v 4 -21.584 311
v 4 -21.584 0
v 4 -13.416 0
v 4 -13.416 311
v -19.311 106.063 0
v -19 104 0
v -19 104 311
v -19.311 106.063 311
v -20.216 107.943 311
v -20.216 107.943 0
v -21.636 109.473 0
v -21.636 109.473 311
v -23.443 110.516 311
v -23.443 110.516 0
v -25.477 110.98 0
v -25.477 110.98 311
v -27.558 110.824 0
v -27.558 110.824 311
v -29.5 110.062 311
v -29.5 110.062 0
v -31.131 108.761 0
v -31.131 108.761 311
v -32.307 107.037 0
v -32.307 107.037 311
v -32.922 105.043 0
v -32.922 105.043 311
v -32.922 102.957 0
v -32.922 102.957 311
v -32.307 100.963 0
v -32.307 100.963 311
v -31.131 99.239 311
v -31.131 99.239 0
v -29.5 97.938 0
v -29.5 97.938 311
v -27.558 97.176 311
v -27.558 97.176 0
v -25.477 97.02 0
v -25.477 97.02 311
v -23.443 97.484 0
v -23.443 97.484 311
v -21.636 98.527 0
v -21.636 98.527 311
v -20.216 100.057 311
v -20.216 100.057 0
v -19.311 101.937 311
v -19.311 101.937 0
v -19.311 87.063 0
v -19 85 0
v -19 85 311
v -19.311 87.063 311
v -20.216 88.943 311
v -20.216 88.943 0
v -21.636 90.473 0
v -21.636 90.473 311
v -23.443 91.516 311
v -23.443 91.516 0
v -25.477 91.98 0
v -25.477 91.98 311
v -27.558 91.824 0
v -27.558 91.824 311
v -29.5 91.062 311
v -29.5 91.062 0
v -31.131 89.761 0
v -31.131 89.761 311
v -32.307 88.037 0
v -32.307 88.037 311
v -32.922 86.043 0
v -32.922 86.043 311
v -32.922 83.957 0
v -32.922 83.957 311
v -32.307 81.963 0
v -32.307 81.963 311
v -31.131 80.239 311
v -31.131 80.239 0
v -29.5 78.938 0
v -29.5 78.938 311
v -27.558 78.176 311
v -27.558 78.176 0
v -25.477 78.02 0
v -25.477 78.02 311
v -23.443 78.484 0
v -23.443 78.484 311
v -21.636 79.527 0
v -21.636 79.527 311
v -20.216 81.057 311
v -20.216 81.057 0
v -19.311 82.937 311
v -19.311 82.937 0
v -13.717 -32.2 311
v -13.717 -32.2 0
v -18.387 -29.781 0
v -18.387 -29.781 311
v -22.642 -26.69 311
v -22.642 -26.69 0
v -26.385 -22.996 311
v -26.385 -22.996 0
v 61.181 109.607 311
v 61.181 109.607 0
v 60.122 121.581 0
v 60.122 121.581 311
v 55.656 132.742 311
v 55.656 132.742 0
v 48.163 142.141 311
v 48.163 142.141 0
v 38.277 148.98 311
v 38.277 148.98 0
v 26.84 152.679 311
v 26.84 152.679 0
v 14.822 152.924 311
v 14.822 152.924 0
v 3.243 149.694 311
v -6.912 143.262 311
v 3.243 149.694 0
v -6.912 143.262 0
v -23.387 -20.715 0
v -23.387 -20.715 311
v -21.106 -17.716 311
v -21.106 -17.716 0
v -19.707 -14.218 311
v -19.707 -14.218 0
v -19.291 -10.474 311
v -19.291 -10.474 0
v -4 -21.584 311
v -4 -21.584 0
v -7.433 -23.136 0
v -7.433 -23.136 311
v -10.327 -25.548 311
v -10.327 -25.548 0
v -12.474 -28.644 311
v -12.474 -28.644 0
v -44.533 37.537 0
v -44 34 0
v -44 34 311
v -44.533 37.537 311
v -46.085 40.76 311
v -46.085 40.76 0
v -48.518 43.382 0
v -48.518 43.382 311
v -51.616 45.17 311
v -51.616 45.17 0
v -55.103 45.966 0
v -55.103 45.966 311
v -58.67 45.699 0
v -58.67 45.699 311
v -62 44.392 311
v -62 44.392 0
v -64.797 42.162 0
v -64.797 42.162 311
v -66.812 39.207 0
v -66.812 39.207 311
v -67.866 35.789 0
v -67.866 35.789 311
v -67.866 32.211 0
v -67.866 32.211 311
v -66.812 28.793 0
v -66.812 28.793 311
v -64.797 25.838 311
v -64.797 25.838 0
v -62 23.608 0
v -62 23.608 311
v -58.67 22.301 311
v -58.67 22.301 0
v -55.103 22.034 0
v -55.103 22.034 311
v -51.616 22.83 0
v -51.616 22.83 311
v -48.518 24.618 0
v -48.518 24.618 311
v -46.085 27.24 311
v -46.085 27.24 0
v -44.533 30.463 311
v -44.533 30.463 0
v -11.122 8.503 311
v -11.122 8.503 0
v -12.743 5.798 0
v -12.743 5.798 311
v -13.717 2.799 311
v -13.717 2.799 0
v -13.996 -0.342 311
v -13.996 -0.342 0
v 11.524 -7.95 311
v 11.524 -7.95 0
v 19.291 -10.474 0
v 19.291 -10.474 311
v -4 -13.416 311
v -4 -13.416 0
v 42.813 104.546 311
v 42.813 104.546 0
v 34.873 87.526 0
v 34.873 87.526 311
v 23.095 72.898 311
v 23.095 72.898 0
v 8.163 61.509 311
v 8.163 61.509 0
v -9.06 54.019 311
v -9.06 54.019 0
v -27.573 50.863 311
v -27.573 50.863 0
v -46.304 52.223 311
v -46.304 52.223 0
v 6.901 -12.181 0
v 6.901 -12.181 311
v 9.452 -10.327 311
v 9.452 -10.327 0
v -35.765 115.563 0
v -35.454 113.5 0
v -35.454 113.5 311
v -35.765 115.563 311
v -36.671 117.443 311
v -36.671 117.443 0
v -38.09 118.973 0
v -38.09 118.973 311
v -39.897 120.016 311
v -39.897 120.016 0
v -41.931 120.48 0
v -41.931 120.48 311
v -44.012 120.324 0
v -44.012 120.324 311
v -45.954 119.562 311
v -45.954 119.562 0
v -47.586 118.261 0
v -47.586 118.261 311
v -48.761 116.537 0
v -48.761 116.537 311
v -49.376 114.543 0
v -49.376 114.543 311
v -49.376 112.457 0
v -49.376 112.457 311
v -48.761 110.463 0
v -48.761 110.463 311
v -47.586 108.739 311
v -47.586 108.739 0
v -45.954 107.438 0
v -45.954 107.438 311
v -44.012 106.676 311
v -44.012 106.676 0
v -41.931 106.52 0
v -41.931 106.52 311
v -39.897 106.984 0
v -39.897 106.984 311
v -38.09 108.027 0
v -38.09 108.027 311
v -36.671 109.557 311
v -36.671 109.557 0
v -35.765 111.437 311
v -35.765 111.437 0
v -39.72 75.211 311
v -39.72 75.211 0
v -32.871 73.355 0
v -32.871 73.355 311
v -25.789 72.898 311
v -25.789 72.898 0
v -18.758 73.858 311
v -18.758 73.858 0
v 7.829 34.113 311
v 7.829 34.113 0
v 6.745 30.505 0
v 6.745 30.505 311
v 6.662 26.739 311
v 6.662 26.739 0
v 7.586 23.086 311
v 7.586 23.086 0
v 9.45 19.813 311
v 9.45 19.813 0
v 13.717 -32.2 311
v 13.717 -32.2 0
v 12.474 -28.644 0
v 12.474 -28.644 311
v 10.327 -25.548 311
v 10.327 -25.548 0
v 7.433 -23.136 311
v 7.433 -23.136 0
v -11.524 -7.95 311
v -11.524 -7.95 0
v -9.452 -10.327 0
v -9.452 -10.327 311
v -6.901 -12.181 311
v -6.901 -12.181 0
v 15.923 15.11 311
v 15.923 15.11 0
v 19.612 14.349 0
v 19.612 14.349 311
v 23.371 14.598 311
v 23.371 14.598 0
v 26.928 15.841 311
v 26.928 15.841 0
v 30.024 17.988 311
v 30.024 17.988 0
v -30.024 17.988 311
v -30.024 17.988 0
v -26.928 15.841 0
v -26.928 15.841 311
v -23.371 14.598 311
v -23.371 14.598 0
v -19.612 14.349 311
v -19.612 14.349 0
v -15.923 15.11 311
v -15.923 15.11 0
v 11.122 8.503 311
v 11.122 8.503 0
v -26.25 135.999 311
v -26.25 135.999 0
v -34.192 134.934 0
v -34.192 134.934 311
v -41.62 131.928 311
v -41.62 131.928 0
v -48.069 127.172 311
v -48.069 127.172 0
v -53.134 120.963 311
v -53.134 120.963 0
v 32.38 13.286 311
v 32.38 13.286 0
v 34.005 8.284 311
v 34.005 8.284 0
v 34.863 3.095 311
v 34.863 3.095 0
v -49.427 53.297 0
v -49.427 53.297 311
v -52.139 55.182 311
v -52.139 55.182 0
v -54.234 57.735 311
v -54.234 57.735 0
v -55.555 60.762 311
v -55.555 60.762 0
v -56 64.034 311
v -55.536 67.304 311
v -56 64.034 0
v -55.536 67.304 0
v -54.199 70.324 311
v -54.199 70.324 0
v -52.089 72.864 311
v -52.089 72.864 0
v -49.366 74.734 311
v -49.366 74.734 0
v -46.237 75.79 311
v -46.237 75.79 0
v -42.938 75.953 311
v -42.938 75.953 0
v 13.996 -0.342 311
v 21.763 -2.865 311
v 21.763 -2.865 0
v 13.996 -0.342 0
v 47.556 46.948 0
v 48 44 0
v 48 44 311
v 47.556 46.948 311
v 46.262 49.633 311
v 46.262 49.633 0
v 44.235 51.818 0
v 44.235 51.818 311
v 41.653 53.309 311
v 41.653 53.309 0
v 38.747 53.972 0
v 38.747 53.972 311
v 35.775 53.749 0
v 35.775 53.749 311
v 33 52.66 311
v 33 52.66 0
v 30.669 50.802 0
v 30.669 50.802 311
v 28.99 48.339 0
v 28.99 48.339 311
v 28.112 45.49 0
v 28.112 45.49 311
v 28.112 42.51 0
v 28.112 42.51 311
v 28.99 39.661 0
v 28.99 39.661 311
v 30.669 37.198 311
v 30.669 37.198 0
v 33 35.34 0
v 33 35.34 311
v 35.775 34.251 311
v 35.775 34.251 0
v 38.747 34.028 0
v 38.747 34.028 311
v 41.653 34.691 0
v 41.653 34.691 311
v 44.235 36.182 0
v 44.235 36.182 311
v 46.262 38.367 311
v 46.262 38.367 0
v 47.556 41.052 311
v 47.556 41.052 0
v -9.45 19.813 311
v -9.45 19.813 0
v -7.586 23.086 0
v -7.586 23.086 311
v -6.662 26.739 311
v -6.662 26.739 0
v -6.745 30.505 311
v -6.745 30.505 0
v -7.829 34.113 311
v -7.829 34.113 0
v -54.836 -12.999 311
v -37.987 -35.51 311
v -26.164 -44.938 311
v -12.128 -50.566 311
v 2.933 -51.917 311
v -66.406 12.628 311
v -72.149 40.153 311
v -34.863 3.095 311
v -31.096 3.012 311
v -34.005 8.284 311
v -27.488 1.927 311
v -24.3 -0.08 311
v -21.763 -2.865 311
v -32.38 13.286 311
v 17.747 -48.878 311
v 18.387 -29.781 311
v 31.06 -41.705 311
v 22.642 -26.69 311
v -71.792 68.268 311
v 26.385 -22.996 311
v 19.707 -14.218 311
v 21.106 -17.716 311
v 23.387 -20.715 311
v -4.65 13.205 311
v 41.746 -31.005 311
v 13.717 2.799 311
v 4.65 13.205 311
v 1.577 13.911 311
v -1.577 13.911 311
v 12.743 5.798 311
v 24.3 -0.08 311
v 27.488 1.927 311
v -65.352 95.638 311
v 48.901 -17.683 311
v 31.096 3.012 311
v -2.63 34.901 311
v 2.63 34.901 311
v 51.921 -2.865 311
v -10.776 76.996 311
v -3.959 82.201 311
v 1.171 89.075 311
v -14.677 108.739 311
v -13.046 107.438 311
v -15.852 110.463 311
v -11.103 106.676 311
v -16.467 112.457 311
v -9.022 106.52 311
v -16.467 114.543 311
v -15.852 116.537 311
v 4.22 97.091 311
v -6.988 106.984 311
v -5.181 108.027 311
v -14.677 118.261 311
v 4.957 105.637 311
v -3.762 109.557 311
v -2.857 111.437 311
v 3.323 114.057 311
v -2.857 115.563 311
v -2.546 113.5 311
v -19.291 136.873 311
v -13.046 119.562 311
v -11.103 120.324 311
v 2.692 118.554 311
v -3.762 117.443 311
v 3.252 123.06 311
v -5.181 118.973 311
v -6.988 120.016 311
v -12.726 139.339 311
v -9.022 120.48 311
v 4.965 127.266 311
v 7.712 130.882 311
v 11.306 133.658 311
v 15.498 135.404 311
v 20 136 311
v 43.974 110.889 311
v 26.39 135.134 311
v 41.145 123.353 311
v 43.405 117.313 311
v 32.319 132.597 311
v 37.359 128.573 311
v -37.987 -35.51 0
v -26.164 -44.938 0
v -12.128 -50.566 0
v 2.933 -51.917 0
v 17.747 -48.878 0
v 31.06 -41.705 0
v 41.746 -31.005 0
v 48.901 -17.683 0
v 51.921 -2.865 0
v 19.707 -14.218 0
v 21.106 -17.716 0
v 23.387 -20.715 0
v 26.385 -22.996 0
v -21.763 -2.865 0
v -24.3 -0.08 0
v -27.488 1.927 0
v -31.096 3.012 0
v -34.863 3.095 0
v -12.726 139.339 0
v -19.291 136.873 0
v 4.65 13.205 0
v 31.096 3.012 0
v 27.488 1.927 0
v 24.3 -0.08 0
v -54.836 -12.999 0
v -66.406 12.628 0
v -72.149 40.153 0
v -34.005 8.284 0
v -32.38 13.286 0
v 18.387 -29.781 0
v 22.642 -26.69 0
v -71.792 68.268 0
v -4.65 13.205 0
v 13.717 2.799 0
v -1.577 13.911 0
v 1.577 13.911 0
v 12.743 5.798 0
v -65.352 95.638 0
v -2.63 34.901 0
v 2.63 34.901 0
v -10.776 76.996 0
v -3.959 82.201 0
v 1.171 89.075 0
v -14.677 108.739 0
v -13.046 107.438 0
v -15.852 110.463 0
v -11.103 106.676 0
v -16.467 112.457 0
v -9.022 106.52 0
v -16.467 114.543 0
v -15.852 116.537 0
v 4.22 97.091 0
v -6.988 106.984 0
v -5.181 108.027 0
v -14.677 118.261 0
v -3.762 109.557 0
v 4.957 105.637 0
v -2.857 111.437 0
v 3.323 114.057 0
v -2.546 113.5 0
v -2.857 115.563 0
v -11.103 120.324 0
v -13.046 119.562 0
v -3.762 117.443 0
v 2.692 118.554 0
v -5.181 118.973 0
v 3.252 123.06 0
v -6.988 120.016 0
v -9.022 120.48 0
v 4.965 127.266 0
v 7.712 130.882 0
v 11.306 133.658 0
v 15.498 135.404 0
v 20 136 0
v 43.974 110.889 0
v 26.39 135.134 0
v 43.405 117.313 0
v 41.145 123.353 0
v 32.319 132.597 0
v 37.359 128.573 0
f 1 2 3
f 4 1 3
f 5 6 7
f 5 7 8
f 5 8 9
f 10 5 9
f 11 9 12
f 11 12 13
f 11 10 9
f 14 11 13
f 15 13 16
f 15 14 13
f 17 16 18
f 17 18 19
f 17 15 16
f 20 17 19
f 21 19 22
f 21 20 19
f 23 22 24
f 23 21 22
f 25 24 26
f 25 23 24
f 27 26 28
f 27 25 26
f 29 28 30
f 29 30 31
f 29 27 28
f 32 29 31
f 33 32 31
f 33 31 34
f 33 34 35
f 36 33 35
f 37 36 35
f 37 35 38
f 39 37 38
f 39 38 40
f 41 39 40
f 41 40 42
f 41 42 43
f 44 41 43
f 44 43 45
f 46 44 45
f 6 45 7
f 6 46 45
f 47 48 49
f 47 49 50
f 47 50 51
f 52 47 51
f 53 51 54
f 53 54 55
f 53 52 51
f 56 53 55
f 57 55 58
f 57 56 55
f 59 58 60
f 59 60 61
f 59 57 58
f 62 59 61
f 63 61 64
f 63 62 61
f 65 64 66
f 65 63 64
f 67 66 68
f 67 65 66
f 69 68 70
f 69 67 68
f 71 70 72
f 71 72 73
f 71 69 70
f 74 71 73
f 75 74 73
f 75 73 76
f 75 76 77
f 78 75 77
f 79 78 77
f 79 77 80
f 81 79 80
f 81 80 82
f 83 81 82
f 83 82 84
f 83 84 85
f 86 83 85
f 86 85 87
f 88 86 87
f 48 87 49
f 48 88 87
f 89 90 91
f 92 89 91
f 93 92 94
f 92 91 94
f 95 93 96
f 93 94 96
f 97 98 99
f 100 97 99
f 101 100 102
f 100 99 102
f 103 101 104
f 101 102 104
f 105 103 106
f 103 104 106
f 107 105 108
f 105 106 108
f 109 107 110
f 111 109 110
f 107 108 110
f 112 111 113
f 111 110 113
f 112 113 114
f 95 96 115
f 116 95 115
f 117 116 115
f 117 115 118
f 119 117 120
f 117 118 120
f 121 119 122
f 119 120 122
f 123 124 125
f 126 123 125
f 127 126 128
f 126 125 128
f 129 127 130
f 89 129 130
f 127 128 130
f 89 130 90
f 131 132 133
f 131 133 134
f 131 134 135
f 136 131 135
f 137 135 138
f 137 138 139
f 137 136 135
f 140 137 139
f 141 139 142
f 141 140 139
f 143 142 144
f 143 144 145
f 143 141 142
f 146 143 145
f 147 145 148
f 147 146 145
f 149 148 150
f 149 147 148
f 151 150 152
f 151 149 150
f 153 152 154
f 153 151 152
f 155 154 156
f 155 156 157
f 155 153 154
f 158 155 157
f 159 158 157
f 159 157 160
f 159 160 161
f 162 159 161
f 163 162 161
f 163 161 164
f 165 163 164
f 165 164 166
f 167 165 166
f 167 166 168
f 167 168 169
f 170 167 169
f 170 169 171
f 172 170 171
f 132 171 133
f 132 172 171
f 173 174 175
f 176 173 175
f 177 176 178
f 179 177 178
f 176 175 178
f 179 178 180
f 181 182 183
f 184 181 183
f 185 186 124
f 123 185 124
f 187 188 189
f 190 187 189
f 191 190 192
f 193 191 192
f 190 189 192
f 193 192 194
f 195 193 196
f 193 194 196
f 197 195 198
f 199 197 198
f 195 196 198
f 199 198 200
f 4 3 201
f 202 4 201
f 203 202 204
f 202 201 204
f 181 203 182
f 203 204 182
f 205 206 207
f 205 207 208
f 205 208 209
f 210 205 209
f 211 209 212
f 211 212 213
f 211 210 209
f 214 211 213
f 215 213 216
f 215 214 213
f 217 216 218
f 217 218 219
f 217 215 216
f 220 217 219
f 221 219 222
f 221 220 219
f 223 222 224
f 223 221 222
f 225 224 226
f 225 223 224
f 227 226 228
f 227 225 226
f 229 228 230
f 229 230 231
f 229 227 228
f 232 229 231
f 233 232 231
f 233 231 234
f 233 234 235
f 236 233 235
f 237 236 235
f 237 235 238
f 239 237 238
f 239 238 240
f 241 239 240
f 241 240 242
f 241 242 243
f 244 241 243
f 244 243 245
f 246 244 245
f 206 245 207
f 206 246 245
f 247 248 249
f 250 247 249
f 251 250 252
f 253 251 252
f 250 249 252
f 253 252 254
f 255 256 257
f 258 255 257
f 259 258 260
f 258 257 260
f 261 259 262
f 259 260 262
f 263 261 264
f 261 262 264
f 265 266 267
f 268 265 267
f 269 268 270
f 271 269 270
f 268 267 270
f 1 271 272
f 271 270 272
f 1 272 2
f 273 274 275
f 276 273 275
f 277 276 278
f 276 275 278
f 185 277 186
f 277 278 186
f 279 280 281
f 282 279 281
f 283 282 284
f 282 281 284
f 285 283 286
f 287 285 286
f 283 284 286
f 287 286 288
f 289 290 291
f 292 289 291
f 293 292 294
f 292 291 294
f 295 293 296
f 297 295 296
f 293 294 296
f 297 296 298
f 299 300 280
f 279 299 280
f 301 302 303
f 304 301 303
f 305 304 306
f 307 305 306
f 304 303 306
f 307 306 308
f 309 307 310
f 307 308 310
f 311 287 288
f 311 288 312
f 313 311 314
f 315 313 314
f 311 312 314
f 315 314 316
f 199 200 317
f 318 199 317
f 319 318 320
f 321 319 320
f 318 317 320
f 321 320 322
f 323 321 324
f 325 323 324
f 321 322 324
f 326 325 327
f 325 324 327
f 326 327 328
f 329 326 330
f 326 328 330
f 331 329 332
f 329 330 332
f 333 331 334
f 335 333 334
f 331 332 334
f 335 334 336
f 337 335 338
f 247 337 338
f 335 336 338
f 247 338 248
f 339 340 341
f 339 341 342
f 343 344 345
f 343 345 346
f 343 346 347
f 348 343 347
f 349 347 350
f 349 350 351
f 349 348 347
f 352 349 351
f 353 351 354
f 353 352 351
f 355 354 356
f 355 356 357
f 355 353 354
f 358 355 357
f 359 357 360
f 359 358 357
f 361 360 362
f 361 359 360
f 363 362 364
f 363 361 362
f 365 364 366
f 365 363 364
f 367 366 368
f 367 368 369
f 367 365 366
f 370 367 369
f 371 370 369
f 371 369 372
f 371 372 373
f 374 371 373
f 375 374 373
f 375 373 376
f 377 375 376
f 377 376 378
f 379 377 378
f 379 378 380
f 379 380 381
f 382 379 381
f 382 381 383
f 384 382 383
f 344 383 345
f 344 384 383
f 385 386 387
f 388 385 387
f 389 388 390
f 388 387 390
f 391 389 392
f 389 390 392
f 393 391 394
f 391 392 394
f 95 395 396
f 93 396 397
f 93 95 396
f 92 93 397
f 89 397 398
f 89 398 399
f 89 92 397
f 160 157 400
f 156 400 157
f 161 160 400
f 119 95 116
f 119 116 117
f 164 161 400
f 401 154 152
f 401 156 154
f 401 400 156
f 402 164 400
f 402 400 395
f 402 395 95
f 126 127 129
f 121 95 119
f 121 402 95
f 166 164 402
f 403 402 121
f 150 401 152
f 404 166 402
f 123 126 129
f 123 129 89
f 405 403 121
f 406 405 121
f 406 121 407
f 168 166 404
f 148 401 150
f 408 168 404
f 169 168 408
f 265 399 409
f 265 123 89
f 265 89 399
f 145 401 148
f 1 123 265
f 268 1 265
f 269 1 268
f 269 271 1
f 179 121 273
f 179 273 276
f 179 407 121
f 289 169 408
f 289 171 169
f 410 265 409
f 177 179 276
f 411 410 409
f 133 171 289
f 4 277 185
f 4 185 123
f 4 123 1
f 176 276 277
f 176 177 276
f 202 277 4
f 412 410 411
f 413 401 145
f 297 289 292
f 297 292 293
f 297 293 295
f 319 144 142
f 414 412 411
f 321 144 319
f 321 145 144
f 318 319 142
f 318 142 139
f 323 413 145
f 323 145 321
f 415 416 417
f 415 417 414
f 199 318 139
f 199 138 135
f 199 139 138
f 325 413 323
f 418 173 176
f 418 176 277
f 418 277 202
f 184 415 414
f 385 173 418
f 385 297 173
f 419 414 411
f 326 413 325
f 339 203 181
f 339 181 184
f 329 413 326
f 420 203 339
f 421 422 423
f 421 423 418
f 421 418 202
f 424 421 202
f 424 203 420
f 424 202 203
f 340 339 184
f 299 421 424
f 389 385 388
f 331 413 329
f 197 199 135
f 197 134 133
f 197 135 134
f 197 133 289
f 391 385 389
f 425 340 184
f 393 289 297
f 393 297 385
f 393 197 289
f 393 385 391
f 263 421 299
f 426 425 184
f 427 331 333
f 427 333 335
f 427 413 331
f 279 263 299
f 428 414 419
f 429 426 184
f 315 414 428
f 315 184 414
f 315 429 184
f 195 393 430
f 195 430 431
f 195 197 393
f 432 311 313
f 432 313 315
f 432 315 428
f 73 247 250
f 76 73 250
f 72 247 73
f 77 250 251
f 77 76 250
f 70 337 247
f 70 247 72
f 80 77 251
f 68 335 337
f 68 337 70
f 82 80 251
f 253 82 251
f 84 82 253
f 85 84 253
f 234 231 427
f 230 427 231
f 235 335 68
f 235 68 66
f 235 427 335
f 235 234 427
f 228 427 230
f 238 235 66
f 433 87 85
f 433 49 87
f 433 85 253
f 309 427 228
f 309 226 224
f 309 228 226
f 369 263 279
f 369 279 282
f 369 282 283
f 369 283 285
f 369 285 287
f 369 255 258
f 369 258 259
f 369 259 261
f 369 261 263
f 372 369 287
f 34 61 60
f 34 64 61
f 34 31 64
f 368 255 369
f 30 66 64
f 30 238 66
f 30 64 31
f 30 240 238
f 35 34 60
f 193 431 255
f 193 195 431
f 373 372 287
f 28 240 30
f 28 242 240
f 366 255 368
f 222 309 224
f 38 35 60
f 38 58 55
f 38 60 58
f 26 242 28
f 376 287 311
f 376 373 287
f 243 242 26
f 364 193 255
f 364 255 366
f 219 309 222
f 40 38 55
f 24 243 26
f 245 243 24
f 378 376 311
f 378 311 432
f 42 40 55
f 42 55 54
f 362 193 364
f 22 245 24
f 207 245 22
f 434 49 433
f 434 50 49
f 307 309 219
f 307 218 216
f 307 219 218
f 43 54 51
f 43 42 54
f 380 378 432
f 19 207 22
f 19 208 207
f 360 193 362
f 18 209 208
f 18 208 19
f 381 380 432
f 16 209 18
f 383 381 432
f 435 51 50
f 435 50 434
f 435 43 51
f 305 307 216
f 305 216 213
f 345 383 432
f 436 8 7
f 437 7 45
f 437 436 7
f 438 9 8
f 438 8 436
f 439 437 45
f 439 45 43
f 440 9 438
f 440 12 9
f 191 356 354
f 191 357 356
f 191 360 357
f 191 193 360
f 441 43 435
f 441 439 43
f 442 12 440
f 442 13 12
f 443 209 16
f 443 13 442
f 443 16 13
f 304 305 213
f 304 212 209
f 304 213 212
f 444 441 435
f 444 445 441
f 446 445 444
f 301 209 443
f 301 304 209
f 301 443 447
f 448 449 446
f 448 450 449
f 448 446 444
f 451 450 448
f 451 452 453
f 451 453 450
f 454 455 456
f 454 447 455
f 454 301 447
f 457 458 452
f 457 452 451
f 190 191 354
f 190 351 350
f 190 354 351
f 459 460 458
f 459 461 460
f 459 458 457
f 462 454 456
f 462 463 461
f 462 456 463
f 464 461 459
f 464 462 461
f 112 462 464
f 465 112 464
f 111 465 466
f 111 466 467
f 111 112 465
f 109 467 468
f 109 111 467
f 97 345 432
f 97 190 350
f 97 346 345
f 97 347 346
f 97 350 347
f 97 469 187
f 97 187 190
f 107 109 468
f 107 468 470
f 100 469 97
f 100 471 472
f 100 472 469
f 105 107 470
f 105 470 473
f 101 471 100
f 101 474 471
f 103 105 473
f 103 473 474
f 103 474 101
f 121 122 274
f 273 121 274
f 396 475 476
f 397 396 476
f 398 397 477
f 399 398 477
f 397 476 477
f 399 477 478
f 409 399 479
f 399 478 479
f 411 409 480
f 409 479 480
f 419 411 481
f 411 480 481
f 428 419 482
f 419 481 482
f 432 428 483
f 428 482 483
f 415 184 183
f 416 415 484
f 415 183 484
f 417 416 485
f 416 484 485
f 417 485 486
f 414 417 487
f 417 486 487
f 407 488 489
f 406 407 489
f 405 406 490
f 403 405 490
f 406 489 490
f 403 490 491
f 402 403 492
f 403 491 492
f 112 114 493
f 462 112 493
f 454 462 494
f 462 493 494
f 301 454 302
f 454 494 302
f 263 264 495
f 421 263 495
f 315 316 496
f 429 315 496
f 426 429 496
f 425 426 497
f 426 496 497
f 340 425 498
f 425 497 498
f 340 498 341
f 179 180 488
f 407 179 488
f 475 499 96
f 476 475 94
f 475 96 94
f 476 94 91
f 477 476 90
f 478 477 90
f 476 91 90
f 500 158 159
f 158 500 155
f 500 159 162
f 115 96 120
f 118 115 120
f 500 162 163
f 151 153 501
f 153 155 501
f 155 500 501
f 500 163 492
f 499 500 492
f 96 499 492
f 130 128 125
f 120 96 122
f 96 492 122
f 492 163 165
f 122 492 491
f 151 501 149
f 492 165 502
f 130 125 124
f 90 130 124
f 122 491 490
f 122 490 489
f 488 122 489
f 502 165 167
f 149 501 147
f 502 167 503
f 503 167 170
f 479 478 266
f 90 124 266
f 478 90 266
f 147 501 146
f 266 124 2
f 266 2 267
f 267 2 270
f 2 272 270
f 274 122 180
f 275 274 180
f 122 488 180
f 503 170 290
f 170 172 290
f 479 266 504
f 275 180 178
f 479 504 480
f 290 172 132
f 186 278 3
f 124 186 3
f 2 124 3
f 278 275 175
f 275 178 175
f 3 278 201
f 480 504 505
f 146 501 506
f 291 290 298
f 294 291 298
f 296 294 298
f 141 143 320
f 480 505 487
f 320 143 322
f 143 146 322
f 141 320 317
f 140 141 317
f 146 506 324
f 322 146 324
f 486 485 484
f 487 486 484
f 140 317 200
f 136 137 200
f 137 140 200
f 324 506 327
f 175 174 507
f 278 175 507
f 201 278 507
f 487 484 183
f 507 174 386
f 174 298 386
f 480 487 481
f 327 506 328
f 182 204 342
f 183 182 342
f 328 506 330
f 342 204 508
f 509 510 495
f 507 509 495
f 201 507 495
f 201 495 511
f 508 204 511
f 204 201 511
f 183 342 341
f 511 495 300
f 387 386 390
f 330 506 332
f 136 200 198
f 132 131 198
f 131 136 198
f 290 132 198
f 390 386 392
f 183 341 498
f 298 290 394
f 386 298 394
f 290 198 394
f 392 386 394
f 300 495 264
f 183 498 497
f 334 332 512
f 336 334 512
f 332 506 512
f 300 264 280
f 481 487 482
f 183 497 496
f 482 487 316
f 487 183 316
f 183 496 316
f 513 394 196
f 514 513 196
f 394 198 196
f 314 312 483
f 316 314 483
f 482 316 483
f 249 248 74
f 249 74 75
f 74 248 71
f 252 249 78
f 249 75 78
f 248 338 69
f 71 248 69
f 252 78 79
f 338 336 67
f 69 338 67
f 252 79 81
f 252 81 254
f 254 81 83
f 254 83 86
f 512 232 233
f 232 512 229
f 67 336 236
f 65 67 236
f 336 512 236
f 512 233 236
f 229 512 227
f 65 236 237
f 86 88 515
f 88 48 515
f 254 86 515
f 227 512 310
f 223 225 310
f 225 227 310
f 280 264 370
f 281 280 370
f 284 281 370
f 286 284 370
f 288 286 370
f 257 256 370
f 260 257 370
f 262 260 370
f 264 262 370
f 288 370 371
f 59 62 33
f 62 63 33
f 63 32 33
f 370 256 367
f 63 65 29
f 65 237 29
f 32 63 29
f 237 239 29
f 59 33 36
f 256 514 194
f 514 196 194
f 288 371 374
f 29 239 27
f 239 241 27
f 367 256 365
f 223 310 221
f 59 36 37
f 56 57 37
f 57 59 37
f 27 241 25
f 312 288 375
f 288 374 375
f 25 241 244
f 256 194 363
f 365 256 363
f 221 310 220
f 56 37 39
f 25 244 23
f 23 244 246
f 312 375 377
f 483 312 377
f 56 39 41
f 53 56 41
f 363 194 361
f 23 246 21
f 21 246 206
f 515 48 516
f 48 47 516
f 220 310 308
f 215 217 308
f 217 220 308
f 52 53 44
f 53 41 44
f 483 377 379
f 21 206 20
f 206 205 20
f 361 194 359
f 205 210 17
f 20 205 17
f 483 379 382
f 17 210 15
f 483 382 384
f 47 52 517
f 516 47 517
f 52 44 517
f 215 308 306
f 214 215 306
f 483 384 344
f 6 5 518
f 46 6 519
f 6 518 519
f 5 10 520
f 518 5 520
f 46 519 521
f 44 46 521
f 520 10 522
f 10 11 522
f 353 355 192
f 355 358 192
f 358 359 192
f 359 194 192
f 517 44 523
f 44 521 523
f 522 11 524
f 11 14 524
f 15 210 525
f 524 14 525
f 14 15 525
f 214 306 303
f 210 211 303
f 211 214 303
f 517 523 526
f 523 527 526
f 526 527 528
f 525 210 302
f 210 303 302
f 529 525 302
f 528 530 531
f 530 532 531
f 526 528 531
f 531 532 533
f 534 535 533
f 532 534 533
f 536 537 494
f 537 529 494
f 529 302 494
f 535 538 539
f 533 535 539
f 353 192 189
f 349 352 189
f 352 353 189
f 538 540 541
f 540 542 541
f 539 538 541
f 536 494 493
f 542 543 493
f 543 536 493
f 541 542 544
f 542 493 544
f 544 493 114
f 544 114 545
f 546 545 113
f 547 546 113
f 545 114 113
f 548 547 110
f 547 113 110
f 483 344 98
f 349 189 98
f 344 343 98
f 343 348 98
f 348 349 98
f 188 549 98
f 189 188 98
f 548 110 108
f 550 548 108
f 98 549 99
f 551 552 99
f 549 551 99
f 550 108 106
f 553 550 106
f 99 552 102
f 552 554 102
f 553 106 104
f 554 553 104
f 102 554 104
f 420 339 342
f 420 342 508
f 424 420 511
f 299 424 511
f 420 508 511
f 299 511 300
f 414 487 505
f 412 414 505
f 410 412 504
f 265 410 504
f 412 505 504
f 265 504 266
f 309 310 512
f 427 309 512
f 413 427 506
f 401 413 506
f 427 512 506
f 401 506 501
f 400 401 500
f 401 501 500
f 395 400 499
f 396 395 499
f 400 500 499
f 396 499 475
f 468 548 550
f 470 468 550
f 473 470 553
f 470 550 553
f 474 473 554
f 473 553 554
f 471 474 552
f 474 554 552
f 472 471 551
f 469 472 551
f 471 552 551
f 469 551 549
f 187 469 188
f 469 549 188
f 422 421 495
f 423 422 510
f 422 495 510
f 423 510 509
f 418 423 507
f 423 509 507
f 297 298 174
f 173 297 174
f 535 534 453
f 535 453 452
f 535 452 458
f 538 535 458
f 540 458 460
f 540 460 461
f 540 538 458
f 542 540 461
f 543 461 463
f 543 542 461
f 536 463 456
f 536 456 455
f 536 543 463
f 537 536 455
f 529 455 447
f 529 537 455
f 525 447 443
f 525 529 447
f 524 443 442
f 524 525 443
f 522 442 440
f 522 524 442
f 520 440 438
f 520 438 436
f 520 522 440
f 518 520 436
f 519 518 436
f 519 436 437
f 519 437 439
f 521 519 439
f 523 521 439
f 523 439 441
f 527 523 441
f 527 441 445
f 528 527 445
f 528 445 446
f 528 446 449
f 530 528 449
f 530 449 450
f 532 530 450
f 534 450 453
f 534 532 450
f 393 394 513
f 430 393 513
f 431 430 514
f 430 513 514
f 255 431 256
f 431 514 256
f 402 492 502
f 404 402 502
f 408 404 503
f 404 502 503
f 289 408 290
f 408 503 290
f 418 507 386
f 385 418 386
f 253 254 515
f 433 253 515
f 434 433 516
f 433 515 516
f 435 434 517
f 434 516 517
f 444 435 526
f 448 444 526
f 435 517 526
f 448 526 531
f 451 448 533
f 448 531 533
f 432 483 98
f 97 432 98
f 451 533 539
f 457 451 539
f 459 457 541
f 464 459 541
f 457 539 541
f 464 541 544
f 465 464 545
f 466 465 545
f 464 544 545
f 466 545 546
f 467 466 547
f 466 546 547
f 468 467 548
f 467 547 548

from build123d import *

# Parameters (mm, degrees)
SKETCH_1_R      = 12
SKETCH_1_R_2    = 10
SKETCH_1_R_3    = 7
EXTRUDE_1_DEPTH = 311


with BuildPart() as part:
    # Эскиз1 → Бобышка-Вытянуть1 (new body)
    with BuildSketch(Plane.XY):
        with BuildLine():
            ThreePointArc((-37.98749513, -35.509860796), (17.746819787, -48.877913084), (51.920988797, -2.865470704))
            Line((51.920988797, -2.865470704), (61.180982268, 109.607242119))
            ThreePointArc((61.180982268, 109.607242119), (38.277381578, 148.980209754), (-6.912328256, 143.262200477))
            ThreePointArc((-6.912328256, 143.262200477), (-15.936398986, 137.913716983), (-26.250179642, 135.999022019))
            ThreePointArc((-26.250179642, 135.999022019), (-41.620493207, 131.928483524), (-53.134256146, 120.962669112))
            ThreePointArc((-53.134256146, 120.962669112), (-72.149102751, 40.15262637), (-37.98749513, -35.509860796))
        make_face()
        with BuildLine():
            ThreePointArc((-11.523694148, -7.950124099), (-8.228993532, -11.326237921), (-4, -13.416407865))
            Line((-4, -13.416407865), (-4, -21.583592135))
            ThreePointArc((-4, -21.583592135), (-10.327212311, -25.547556618), (-13.71714256, -32.2))
            ThreePointArc((-13.71714256, -32.2), (-20.57248383, -28.315594803), (-26.38518966, -22.996125035))
            ThreePointArc((-26.38518966, -22.996125035), (-21.105886088, -17.716391723), (-19.291147968, -10.473922835))
            Line((-19.291147968, -10.473922835), (-11.523694148, -7.950124099))
        make_face(mode=Mode.SUBTRACT)
        with Locations((-56, 34)):
            Circle(SKETCH_1_R, mode=Mode.SUBTRACT)
        with BuildLine():
            ThreePointArc((-11.122034659, 8.502960957), (-13.314791228, 4.326237921), (-13.995830103, -0.341671969))
            Line((-13.995830103, -0.341671969), (-21.763283923, -2.865470704))
            ThreePointArc((-21.763283923, -2.865470704), (-27.488454305, 1.927133403), (-34.86284999, 3.095430597))
            ThreePointArc((-34.86284999, 3.095430597), (-33.28697807, 10.815594803), (-30.024086569, 17.987613119))
            ThreePointArc((-30.024086569, 17.987613119), (-23.371367276, 14.598224375), (-15.922585126, 15.110351828))
            Line((-15.922585126, 15.110351828), (-11.122034659, 8.502960957))
        make_face(mode=Mode.SUBTRACT)
        with BuildLine():
            Line((4, -21.583592135), (4, -13.416407865))
            ThreePointArc((4, -13.416407865), (8.228993532, -11.326237921), (11.523694148, -7.950124099))
            Line((11.523694148, -7.950124099), (19.291147968, -10.473922835))
            ThreePointArc((19.291147968, -10.473922835), (21.105886088, -17.716391723), (26.38518966, -22.996125035))
            ThreePointArc((26.38518966, -22.996125035), (20.57248383, -28.315594803), (13.71714256, -32.2))
            ThreePointArc((13.71714256, -32.2), (10.327212311, -25.547556618), (4, -21.583592135))
        make_face(mode=Mode.SUBTRACT)
        with BuildLine():
            ThreePointArc((4.649898704, 13.205242975), (0, 14), (-4.649898704, 13.205242975))
            Line((-4.649898704, 13.205242975), (-9.450449171, 19.812633846))
            ThreePointArc((-9.450449171, 19.812633846), (-6.661586748, 26.738590562), (-7.829283679, 34.113081319))
            ThreePointArc((-7.829283679, 34.113081319), (0, 35), (7.829283679, 34.113081319))
            ThreePointArc((7.829283679, 34.113081319), (6.661586748, 26.738590562), (9.450449171, 19.812633846))
            Line((9.450449171, 19.812633846), (4.649898704, 13.205242975))
        make_face(mode=Mode.SUBTRACT)
        with BuildLine():
            ThreePointArc((13.995830103, -0.341671969), (13.314791228, 4.326237921), (11.122034659, 8.502960957))
            Line((11.122034659, 8.502960957), (15.922585126, 15.110351828))
            ThreePointArc((15.922585126, 15.110351828), (23.371367276, 14.598224375), (30.024086569, 17.987613119))
            ThreePointArc((30.024086569, 17.987613119), (33.28697807, 10.815594803), (34.86284999, 3.095430597))
            ThreePointArc((34.86284999, 3.095430597), (27.488454305, 1.927133403), (21.763283923, -2.865470704))
            Line((21.763283923, -2.865470704), (13.995830103, -0.341671969))
        make_face(mode=Mode.SUBTRACT)
        with Locations((38, 44)):
            Circle(SKETCH_1_R_2, mode=Mode.SUBTRACT)
        with Locations((-26, 85)):
            Circle(SKETCH_1_R_3, mode=Mode.SUBTRACT)
        with BuildLine():
            ThreePointArc((-39.719957497, 75.210764299), (-29.341451826, 72.9489184), (-18.758284903, 73.857711393))
            ThreePointArc((-18.758284903, 73.857711393), (1.170574134, 89.074856744), (3.323461498, 114.056570279))
            ThreePointArc((3.323461498, 114.056570279), (6.219388218, 129.16434937), (20, 136))
            ThreePointArc((20, 136), (39.428131569, 126.090695644), (42.812990739, 104.545641977))
            ThreePointArc((42.812990739, 104.545641977), (8.162699165, 61.508737426), (-46.303776516, 52.223217173))
            ThreePointArc((-46.303776516, 52.223217173), (-55.536170835, 67.30405243), (-39.719957497, 75.210764299))
        make_face(mode=Mode.SUBTRACT)
        with Locations((-42.454482672, 113.5)):
            Circle(SKETCH_1_R_3, mode=Mode.SUBTRACT)
        with Locations((-26, 104)):
            Circle(SKETCH_1_R_3, mode=Mode.SUBTRACT)
        with Locations((-9.545517328, 113.5)):
            Circle(SKETCH_1_R_3, mode=Mode.SUBTRACT)
    extrude(amount=EXTRUDE_1_DEPTH)


solid = part.part
